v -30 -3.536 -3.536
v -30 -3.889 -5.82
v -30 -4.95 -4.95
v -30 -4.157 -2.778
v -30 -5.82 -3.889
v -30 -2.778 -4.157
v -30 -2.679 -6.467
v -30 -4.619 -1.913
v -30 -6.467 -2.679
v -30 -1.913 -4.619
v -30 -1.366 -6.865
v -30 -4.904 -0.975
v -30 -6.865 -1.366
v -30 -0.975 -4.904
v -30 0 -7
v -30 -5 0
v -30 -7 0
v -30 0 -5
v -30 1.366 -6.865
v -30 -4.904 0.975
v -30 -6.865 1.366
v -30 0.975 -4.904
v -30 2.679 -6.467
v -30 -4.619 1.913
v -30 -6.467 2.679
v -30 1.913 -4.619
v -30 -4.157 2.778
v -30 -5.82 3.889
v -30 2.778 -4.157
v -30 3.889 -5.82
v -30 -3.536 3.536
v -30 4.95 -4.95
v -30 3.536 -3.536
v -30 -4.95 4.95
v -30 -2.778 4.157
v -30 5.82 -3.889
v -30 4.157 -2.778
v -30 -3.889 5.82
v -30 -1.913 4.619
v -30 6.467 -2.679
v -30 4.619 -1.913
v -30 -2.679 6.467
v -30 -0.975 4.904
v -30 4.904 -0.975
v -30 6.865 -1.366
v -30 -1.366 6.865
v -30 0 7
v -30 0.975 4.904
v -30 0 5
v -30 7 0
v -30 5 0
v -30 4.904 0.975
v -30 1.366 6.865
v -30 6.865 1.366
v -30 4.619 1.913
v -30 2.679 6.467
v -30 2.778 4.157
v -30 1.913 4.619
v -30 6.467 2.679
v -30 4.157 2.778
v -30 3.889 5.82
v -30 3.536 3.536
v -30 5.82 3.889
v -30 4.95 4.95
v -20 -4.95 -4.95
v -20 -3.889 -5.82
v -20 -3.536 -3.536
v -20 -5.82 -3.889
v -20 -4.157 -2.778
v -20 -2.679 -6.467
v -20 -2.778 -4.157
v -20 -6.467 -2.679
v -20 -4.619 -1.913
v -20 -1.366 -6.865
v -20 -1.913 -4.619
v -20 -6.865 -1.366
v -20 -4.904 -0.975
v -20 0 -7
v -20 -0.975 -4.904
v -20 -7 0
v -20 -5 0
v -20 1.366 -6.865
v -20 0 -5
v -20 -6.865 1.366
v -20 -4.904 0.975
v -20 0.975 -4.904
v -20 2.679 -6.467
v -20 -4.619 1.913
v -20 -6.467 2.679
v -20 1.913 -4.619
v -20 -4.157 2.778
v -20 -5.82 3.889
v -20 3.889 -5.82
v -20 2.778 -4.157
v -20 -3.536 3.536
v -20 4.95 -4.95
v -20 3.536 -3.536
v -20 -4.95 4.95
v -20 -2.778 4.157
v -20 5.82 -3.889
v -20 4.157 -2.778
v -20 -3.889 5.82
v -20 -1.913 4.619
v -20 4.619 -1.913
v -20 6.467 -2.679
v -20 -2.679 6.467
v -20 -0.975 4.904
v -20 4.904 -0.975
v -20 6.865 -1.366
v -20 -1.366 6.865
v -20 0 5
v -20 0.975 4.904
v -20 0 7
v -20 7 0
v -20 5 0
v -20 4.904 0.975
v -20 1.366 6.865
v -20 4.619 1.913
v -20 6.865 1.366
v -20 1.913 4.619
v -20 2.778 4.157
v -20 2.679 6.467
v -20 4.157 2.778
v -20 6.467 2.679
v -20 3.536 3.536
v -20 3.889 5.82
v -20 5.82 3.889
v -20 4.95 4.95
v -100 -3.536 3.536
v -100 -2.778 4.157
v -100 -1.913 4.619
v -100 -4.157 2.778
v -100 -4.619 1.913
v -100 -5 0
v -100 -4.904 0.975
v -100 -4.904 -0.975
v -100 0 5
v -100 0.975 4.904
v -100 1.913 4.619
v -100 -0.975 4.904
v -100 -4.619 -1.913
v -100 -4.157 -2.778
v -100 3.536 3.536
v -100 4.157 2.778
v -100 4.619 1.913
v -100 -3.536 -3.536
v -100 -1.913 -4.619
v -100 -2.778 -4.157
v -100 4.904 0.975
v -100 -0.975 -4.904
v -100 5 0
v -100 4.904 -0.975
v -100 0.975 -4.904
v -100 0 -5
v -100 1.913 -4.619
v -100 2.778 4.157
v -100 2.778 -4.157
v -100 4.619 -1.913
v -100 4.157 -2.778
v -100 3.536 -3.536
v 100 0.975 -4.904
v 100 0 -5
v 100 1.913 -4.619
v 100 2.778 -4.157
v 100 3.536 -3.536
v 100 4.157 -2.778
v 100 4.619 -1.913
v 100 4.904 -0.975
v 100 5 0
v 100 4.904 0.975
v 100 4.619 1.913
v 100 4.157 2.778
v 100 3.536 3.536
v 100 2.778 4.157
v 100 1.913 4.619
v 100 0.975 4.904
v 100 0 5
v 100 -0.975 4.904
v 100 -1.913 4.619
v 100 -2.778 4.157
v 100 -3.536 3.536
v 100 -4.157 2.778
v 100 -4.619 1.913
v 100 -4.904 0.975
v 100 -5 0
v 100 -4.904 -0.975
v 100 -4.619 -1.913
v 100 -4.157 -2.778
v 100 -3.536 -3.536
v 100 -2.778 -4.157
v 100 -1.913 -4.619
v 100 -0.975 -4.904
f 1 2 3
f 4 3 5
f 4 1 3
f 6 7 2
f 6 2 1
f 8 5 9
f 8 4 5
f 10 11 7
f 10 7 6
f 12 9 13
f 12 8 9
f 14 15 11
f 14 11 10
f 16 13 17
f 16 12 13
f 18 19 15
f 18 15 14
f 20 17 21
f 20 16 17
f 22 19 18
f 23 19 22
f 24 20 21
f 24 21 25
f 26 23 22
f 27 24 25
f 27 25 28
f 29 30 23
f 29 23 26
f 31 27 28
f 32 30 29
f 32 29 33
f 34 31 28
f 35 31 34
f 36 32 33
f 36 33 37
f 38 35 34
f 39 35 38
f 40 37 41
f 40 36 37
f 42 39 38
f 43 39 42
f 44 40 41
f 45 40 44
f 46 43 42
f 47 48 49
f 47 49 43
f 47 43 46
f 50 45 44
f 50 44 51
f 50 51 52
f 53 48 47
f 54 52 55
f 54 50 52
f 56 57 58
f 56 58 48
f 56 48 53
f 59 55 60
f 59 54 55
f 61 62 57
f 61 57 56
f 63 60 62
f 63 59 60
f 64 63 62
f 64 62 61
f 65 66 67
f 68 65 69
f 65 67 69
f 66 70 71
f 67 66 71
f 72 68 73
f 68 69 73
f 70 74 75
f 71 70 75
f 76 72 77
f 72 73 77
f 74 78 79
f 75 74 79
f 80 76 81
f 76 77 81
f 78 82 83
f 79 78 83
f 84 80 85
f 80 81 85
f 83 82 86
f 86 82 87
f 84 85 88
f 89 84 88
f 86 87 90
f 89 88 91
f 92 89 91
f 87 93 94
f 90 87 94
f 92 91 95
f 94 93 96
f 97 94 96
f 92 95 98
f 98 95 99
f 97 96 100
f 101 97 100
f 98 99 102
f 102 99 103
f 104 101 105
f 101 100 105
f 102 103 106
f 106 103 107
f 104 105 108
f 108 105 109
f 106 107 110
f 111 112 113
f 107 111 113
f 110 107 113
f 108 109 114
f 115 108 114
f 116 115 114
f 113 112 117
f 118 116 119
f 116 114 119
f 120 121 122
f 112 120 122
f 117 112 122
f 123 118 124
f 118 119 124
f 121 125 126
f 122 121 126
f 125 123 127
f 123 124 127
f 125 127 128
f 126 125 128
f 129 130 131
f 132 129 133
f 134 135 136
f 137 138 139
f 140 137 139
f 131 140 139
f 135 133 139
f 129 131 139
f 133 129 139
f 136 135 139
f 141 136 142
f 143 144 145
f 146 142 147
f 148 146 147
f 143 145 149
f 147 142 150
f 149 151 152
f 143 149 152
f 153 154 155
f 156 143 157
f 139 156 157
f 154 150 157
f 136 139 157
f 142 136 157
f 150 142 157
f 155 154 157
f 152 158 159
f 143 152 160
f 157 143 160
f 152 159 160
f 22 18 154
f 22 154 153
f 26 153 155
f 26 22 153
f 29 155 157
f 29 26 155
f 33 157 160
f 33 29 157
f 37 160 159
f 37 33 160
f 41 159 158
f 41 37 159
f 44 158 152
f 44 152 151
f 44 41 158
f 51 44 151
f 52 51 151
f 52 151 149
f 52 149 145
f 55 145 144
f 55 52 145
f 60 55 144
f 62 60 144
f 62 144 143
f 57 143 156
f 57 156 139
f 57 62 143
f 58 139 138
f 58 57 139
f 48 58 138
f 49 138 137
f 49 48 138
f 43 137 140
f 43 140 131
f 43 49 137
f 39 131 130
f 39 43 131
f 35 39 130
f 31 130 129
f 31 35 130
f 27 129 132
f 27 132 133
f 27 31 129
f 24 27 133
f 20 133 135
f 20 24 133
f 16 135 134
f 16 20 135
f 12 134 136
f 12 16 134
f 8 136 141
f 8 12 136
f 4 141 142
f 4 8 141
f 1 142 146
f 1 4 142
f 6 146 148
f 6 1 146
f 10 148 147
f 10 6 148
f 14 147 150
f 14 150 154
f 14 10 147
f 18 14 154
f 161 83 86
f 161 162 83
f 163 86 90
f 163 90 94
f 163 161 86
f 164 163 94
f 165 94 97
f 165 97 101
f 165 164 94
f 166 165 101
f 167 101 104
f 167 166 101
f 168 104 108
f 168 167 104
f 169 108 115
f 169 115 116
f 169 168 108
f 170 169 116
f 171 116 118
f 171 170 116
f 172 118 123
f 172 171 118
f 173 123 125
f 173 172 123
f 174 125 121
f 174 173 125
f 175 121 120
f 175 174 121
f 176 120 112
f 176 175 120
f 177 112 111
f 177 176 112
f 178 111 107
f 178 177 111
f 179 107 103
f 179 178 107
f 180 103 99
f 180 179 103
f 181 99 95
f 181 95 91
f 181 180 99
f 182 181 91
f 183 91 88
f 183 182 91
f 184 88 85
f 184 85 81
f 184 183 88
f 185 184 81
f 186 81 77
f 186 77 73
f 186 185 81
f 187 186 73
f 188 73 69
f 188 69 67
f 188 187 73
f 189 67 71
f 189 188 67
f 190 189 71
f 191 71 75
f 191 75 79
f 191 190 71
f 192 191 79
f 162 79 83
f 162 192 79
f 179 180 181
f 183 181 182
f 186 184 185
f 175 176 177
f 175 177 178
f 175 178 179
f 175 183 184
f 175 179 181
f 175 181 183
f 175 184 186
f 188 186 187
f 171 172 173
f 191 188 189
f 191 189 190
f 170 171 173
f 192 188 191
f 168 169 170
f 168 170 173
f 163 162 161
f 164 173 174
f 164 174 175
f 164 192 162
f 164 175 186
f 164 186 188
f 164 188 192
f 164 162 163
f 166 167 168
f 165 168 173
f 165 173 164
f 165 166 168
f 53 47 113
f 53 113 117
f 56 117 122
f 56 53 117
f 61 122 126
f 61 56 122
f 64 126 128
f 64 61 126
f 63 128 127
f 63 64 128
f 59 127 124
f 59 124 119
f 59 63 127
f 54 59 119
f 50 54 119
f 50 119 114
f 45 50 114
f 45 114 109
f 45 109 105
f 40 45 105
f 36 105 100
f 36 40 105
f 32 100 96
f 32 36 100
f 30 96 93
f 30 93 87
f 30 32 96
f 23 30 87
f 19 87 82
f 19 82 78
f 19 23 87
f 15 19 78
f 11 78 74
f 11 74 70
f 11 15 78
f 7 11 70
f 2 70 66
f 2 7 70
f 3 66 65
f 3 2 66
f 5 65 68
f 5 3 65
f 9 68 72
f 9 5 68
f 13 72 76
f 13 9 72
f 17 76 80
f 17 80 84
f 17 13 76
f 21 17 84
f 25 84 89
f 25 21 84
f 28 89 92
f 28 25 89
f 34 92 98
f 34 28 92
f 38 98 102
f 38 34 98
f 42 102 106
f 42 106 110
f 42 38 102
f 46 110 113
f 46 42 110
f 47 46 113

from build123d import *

# Parameters (mm, degrees)
SKETCH1_R           = 5
BOSS_EXTRUDE1_DEPTH = 100
BOSS_EXTRUDE2_START = -70
SKETCH2_R           = 7
BOSS_EXTRUDE2_DEPTH = 10


with BuildPart() as part:
    # Sketch1 → Boss-Extrude1 (new body, symmetric)
    with BuildSketch(Plane(origin=(0, 0, 0), x_dir=(0, 0, -1), z_dir=(1, 0, 0))):
        Circle(SKETCH1_R)
    extrude(amount=BOSS_EXTRUDE1_DEPTH, both=True)

    # Sketch2 → Boss-Extrude2 (add)
    with BuildSketch(Plane.ZY.offset(100).offset(BOSS_EXTRUDE2_START)):
        Circle(SKETCH2_R)
    extrude(amount=-BOSS_EXTRUDE2_DEPTH)


solid = part.part
